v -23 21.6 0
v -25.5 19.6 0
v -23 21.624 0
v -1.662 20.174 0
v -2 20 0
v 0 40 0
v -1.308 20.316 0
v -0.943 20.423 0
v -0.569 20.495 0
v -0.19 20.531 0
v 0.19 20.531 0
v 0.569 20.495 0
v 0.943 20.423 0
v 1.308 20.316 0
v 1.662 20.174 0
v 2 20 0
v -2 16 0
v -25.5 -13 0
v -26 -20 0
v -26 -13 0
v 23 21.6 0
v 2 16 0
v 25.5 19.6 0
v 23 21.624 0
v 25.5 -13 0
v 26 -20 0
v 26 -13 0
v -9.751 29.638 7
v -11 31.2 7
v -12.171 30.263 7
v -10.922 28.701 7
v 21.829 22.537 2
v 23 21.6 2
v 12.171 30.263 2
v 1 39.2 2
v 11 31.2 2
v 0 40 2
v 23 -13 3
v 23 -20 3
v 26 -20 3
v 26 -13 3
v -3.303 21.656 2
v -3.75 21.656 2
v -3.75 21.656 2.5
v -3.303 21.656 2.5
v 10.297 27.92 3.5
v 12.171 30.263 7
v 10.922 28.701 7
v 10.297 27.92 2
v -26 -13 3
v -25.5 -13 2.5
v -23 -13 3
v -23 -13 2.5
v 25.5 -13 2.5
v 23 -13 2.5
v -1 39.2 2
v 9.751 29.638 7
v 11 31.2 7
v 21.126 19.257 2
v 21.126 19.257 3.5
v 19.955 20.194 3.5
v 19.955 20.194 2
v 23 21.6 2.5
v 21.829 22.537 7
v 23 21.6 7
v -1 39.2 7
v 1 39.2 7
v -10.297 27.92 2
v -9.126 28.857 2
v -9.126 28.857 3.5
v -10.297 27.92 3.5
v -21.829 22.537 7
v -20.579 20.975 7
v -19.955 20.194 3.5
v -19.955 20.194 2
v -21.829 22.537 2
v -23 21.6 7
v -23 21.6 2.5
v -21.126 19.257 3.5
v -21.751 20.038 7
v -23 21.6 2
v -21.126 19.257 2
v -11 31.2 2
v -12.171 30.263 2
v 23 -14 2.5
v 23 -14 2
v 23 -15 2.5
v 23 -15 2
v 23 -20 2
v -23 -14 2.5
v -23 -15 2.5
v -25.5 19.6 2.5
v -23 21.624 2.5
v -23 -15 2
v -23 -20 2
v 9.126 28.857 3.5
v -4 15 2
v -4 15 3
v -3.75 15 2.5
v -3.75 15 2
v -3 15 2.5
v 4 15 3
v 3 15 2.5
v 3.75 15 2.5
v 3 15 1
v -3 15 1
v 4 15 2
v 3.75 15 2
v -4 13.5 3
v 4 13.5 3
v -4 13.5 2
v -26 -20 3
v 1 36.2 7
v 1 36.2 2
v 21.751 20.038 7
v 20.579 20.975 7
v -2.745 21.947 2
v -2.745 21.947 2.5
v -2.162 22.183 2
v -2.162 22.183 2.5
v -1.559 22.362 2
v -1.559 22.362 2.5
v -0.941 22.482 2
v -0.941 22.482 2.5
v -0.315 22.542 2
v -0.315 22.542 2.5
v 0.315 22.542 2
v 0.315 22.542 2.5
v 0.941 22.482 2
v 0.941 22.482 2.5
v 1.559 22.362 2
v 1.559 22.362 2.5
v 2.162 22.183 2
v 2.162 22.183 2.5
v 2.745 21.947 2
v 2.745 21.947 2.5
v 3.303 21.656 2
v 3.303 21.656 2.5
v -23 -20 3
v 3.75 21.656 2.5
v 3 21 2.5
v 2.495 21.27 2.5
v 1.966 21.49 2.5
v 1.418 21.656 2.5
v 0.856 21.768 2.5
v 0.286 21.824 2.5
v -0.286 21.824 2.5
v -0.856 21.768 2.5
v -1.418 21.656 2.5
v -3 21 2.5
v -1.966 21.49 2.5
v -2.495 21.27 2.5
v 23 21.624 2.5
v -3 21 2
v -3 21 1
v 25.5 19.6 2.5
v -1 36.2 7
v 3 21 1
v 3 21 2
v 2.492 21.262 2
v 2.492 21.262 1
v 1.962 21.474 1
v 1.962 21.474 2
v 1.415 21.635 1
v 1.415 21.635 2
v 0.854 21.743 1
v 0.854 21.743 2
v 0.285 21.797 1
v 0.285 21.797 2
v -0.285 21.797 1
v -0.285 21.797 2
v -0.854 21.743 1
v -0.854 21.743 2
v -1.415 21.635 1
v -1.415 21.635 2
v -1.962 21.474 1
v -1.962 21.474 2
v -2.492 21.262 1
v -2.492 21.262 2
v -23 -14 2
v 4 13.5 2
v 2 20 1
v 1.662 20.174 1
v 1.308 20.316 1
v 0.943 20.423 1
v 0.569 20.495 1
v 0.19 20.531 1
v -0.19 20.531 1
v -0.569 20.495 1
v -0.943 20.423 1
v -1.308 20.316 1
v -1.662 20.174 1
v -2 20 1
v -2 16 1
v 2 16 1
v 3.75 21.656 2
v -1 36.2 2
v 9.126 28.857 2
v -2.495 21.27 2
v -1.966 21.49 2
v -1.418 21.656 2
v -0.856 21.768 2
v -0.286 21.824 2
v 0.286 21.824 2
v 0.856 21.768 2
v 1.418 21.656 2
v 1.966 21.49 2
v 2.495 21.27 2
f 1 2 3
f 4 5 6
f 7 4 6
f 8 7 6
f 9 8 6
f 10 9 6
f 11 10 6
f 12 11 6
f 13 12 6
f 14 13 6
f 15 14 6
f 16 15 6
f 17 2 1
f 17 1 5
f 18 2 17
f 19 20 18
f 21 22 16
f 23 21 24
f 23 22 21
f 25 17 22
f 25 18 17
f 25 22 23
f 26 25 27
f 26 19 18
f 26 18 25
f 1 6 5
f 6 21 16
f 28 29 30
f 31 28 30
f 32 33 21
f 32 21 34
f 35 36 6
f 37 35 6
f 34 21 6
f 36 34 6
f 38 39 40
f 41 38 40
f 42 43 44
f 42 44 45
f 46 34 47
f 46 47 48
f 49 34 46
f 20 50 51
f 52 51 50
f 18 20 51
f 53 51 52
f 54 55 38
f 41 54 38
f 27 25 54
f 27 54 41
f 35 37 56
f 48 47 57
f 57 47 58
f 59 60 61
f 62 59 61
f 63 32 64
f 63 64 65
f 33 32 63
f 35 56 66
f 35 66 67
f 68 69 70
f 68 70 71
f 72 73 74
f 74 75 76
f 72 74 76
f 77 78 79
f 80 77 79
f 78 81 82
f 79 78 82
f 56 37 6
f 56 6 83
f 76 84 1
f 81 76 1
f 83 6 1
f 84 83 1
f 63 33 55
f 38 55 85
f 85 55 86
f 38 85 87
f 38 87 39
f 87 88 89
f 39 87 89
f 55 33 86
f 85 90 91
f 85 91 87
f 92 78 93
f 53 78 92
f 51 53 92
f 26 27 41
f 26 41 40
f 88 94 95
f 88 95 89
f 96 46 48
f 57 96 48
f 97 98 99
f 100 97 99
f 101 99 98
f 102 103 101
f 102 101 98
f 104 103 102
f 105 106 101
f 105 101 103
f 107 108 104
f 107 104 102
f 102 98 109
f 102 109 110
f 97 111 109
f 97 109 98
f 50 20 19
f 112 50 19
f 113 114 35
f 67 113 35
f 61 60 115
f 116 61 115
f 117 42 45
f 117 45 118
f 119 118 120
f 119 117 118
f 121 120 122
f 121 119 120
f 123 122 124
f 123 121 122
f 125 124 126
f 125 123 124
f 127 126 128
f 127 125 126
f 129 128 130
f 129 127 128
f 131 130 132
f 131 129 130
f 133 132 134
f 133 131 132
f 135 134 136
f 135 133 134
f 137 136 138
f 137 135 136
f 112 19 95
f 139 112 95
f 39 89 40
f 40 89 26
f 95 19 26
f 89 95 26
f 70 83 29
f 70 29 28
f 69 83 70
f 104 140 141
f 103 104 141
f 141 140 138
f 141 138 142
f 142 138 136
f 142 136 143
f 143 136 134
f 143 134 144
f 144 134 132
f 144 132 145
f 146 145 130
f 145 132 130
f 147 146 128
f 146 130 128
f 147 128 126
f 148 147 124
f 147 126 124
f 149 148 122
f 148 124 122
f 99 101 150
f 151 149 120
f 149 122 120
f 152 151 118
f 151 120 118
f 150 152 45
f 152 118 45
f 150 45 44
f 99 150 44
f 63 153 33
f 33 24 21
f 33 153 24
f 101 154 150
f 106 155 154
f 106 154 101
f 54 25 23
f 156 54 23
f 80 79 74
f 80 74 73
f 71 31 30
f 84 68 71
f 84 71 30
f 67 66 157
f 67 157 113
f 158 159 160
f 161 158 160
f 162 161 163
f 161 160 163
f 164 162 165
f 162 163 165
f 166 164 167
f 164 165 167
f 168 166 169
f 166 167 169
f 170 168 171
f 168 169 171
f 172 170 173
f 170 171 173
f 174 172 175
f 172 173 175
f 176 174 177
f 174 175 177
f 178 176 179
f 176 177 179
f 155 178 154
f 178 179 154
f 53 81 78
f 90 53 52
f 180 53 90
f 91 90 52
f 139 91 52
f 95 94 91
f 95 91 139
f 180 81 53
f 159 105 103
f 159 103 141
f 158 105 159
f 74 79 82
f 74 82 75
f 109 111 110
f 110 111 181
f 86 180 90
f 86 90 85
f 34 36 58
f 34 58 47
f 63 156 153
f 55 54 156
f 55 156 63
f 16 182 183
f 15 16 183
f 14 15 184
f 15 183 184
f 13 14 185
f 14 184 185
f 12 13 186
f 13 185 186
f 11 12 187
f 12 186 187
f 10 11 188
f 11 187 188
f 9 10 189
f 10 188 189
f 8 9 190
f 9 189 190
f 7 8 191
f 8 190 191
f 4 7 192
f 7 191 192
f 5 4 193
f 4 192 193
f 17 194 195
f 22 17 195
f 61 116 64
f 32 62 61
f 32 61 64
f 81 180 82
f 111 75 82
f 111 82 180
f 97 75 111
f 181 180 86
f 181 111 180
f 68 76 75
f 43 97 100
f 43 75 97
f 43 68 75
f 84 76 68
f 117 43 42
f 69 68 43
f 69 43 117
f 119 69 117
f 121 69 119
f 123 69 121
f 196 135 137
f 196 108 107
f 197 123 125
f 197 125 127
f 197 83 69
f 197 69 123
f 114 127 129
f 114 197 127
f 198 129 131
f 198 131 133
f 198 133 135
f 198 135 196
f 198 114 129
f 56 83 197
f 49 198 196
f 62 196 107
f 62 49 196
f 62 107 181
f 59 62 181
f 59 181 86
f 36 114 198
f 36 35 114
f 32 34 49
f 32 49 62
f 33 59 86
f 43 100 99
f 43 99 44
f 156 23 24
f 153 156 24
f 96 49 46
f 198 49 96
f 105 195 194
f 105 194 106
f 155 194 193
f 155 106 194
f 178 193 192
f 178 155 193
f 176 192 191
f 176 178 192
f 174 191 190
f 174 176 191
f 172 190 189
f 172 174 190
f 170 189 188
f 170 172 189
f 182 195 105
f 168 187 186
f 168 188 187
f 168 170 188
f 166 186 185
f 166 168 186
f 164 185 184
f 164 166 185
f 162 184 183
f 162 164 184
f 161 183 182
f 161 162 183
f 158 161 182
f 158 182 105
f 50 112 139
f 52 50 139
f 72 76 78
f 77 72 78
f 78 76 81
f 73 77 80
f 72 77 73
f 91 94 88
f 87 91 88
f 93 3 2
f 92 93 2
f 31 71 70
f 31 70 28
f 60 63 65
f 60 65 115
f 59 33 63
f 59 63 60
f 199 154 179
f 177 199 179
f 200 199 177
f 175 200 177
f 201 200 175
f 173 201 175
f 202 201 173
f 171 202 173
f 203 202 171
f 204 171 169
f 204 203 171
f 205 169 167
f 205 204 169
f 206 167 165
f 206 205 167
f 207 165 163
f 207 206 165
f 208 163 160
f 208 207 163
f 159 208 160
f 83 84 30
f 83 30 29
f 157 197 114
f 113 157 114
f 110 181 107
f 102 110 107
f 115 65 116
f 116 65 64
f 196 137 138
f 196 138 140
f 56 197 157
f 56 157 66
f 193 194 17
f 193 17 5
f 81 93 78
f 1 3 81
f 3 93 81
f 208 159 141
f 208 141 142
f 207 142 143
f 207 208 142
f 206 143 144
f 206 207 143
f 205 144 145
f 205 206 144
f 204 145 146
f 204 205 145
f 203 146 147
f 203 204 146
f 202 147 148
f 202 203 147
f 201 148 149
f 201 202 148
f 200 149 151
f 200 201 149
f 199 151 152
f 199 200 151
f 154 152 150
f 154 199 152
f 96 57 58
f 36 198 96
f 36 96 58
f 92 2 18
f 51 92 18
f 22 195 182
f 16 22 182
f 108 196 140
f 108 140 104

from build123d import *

# Parameters (mm, degrees)
PAD_DEPTH       = 2
POCKET_DEPTH    = 1
POCKET001_DEPTH = 5
SKETCH003_W     = 8
SKETCH003_H     = 1.5
PAD001_DEPTH    = 1
SKETCH006_W     = 3
SKETCH006_H     = 7
PAD004_DEPTH    = 3
PAD005_DEPTH    = 2.5
SKETCH008_W     = 46
SKETCH008_H     = 1
PAD006_DEPTH    = 0.5
PAD008_DEPTH    = 0.5
SKETCH013_W     = 2
SKETCH013_H     = 3.0000000001
PAD009_DEPTH    = 5
POCKET002_DEPTH = 20
POCKET003_DEPTH = 20


with BuildPart() as part:
    # Sketch → Pad (new body)
    with BuildSketch(Plane.XY):
        Polygon((-25, -20), (25, -20), (25, 20), (0, 40), (-25, 20), align=None)
    extrude(amount=PAD_DEPTH)

    # Sketch001 → Pocket (cut)
    with BuildSketch(Plane.XY.offset(2)):
        with BuildLine():
            Line((-3, 15), (3, 15))
            Line((3, 15), (3, 21))
            ThreePointArc((3, 21), (0, 21.8038475773), (-3, 21))
            Line((-3, 15), (-3, 21))
        make_face()
    extrude(amount=-POCKET_DEPTH, mode=Mode.SUBTRACT)

    # Sketch002 → Pocket001 (cut)
    with BuildSketch(Plane.XY.offset(1)):
        with BuildLine():
            Line((-2, 16), (2, 16))
            Line((2, 16), (2, 20))
            ThreePointArc((2, 20), (0, 20.5358983849), (-2, 20))
            Line((-2, 16), (-2, 20))
        make_face()
    extrude(amount=-POCKET001_DEPTH, mode=Mode.SUBTRACT)

    # Sketch003 → Pad001 (new body)
    with BuildSketch(Plane.XY.offset(2)):
        with Locations((0, 14.25)):
            Rectangle(SKETCH003_W, SKETCH003_H)
    extrude(amount=PAD001_DEPTH)

    # Sketch006 → Pad004 (new body)
    with BuildSketch(Plane(origin=(0, 0, 0), x_dir=(1, 0, 0), z_dir=(0, 0, -1))):
        with Locations((-24.5, 16.5)):
            Rectangle(SKETCH006_W, SKETCH006_H)
        with Locations((24.5, 16.5)):
            Rectangle(SKETCH006_W, SKETCH006_H)
    extrude(amount=-PAD004_DEPTH)

    # Sketch007 → Pad005 (new body)
    with BuildSketch(Plane(origin=(0, 0, 0), x_dir=(1, 0, 0), z_dir=(0, 0, -1))):
        Polygon((-25.5, 20), (-23, 20), (-23, -21.624460083), (-25.5, -19.6), align=None)
        Polygon((23, 20), (25.5, 20), (25.5, -19.6), (23, -21.624460083), align=None)
    extrude(amount=-PAD005_DEPTH)

    # Sketch008 → Pad006 (new body)
    with BuildSketch(Plane.XY.offset(2)):
        with Locations((0, -14.5)):
            Rectangle(SKETCH008_W, SKETCH008_H)
    extrude(amount=PAD006_DEPTH)

    # Sketch012 → Pad008 (new body)
    with BuildSketch(Plane.XY.offset(2)):
        with BuildLine():
            Line((3.3030993045, 21.6561501911), (3.75, 21.6561501911))
            Line((3.75, 21.6561501911), (3.75, 15))
            Line((3.75, 15), (3, 15))
            Line((3, 15), (3, 21))
            ThreePointArc((3, 21), (0, 21.8309518948), (-3, 21))
            Line((-3, 21), (-3, 15))
            Line((-3, 15), (-3.75, 15))
            Line((-3.75, 15), (-3.75, 21.6561501911))
            Line((-3.75, 21.6561501911), (-3.3030993046, 21.6561501911))
            ThreePointArc((-3.3030993046, 21.6561501911), (0, 22.55), (3.3030993045, 21.6561501911))
        make_face()
    extrude(amount=PAD008_DEPTH)

    # Sketch013 → Pad009 (new body)
    with BuildSketch(Plane.XY.offset(2)):
        Polygon((-23, 21.6), (-21.1259148573, 19.2573935717), (-19.9546116432, 20.194436143), (-21.8286967858, 22.5370425713), align=None)
        Polygon((-12.1713032142, 30.2629574287), (-11, 31.2), (-9.1259148573, 28.8573935717), (-10.2972180715, 27.9203510003), align=None)
        with Locations((0, 37.7)):
            Rectangle(SKETCH013_W, SKETCH013_H)
        Polygon((11, 31.2), (12.1713032142, 30.2629574287), (10.2972180715, 27.9203510003), (9.1259148573, 28.8573935717), align=None)
        Polygon((21.8286967858, 22.5370425713), (23, 21.6), (21.1259148573, 19.2573935717), (19.9546116432, 20.194436143), align=None)
    extrude(amount=PAD009_DEPTH)

    # Sketch014 → Pocket002 (cut)
    with BuildSketch(Plane(origin=(-3.487804878, -2.7902439024, 0), x_dir=(0.6246950476, -0.7808688094, 0), z_dir=(-0.7808688094, -0.6246950476, 0))):
        Polygon((-29.2347523777, 7), (-28.2347523777, 7), (-28.2347523777, 3.5), align=None)
    extrude(amount=-POCKET002_DEPTH, mode=Mode.SUBTRACT)

    # Sketch015 → Pocket003 (cut)
    with BuildSketch(Plane(origin=(3.487804878, -2.7902439024, 0), x_dir=(0.6246950476, 0.7808688094, 0), z_dir=(0.7808688094, -0.6246950476, 0))):
        Polygon((29.2347523777, 7), (28.2347523777, 7), (28.2347523777, 3.5), align=None)
    extrude(amount=-POCKET003_DEPTH, mode=Mode.SUBTRACT)


solid = part.part
